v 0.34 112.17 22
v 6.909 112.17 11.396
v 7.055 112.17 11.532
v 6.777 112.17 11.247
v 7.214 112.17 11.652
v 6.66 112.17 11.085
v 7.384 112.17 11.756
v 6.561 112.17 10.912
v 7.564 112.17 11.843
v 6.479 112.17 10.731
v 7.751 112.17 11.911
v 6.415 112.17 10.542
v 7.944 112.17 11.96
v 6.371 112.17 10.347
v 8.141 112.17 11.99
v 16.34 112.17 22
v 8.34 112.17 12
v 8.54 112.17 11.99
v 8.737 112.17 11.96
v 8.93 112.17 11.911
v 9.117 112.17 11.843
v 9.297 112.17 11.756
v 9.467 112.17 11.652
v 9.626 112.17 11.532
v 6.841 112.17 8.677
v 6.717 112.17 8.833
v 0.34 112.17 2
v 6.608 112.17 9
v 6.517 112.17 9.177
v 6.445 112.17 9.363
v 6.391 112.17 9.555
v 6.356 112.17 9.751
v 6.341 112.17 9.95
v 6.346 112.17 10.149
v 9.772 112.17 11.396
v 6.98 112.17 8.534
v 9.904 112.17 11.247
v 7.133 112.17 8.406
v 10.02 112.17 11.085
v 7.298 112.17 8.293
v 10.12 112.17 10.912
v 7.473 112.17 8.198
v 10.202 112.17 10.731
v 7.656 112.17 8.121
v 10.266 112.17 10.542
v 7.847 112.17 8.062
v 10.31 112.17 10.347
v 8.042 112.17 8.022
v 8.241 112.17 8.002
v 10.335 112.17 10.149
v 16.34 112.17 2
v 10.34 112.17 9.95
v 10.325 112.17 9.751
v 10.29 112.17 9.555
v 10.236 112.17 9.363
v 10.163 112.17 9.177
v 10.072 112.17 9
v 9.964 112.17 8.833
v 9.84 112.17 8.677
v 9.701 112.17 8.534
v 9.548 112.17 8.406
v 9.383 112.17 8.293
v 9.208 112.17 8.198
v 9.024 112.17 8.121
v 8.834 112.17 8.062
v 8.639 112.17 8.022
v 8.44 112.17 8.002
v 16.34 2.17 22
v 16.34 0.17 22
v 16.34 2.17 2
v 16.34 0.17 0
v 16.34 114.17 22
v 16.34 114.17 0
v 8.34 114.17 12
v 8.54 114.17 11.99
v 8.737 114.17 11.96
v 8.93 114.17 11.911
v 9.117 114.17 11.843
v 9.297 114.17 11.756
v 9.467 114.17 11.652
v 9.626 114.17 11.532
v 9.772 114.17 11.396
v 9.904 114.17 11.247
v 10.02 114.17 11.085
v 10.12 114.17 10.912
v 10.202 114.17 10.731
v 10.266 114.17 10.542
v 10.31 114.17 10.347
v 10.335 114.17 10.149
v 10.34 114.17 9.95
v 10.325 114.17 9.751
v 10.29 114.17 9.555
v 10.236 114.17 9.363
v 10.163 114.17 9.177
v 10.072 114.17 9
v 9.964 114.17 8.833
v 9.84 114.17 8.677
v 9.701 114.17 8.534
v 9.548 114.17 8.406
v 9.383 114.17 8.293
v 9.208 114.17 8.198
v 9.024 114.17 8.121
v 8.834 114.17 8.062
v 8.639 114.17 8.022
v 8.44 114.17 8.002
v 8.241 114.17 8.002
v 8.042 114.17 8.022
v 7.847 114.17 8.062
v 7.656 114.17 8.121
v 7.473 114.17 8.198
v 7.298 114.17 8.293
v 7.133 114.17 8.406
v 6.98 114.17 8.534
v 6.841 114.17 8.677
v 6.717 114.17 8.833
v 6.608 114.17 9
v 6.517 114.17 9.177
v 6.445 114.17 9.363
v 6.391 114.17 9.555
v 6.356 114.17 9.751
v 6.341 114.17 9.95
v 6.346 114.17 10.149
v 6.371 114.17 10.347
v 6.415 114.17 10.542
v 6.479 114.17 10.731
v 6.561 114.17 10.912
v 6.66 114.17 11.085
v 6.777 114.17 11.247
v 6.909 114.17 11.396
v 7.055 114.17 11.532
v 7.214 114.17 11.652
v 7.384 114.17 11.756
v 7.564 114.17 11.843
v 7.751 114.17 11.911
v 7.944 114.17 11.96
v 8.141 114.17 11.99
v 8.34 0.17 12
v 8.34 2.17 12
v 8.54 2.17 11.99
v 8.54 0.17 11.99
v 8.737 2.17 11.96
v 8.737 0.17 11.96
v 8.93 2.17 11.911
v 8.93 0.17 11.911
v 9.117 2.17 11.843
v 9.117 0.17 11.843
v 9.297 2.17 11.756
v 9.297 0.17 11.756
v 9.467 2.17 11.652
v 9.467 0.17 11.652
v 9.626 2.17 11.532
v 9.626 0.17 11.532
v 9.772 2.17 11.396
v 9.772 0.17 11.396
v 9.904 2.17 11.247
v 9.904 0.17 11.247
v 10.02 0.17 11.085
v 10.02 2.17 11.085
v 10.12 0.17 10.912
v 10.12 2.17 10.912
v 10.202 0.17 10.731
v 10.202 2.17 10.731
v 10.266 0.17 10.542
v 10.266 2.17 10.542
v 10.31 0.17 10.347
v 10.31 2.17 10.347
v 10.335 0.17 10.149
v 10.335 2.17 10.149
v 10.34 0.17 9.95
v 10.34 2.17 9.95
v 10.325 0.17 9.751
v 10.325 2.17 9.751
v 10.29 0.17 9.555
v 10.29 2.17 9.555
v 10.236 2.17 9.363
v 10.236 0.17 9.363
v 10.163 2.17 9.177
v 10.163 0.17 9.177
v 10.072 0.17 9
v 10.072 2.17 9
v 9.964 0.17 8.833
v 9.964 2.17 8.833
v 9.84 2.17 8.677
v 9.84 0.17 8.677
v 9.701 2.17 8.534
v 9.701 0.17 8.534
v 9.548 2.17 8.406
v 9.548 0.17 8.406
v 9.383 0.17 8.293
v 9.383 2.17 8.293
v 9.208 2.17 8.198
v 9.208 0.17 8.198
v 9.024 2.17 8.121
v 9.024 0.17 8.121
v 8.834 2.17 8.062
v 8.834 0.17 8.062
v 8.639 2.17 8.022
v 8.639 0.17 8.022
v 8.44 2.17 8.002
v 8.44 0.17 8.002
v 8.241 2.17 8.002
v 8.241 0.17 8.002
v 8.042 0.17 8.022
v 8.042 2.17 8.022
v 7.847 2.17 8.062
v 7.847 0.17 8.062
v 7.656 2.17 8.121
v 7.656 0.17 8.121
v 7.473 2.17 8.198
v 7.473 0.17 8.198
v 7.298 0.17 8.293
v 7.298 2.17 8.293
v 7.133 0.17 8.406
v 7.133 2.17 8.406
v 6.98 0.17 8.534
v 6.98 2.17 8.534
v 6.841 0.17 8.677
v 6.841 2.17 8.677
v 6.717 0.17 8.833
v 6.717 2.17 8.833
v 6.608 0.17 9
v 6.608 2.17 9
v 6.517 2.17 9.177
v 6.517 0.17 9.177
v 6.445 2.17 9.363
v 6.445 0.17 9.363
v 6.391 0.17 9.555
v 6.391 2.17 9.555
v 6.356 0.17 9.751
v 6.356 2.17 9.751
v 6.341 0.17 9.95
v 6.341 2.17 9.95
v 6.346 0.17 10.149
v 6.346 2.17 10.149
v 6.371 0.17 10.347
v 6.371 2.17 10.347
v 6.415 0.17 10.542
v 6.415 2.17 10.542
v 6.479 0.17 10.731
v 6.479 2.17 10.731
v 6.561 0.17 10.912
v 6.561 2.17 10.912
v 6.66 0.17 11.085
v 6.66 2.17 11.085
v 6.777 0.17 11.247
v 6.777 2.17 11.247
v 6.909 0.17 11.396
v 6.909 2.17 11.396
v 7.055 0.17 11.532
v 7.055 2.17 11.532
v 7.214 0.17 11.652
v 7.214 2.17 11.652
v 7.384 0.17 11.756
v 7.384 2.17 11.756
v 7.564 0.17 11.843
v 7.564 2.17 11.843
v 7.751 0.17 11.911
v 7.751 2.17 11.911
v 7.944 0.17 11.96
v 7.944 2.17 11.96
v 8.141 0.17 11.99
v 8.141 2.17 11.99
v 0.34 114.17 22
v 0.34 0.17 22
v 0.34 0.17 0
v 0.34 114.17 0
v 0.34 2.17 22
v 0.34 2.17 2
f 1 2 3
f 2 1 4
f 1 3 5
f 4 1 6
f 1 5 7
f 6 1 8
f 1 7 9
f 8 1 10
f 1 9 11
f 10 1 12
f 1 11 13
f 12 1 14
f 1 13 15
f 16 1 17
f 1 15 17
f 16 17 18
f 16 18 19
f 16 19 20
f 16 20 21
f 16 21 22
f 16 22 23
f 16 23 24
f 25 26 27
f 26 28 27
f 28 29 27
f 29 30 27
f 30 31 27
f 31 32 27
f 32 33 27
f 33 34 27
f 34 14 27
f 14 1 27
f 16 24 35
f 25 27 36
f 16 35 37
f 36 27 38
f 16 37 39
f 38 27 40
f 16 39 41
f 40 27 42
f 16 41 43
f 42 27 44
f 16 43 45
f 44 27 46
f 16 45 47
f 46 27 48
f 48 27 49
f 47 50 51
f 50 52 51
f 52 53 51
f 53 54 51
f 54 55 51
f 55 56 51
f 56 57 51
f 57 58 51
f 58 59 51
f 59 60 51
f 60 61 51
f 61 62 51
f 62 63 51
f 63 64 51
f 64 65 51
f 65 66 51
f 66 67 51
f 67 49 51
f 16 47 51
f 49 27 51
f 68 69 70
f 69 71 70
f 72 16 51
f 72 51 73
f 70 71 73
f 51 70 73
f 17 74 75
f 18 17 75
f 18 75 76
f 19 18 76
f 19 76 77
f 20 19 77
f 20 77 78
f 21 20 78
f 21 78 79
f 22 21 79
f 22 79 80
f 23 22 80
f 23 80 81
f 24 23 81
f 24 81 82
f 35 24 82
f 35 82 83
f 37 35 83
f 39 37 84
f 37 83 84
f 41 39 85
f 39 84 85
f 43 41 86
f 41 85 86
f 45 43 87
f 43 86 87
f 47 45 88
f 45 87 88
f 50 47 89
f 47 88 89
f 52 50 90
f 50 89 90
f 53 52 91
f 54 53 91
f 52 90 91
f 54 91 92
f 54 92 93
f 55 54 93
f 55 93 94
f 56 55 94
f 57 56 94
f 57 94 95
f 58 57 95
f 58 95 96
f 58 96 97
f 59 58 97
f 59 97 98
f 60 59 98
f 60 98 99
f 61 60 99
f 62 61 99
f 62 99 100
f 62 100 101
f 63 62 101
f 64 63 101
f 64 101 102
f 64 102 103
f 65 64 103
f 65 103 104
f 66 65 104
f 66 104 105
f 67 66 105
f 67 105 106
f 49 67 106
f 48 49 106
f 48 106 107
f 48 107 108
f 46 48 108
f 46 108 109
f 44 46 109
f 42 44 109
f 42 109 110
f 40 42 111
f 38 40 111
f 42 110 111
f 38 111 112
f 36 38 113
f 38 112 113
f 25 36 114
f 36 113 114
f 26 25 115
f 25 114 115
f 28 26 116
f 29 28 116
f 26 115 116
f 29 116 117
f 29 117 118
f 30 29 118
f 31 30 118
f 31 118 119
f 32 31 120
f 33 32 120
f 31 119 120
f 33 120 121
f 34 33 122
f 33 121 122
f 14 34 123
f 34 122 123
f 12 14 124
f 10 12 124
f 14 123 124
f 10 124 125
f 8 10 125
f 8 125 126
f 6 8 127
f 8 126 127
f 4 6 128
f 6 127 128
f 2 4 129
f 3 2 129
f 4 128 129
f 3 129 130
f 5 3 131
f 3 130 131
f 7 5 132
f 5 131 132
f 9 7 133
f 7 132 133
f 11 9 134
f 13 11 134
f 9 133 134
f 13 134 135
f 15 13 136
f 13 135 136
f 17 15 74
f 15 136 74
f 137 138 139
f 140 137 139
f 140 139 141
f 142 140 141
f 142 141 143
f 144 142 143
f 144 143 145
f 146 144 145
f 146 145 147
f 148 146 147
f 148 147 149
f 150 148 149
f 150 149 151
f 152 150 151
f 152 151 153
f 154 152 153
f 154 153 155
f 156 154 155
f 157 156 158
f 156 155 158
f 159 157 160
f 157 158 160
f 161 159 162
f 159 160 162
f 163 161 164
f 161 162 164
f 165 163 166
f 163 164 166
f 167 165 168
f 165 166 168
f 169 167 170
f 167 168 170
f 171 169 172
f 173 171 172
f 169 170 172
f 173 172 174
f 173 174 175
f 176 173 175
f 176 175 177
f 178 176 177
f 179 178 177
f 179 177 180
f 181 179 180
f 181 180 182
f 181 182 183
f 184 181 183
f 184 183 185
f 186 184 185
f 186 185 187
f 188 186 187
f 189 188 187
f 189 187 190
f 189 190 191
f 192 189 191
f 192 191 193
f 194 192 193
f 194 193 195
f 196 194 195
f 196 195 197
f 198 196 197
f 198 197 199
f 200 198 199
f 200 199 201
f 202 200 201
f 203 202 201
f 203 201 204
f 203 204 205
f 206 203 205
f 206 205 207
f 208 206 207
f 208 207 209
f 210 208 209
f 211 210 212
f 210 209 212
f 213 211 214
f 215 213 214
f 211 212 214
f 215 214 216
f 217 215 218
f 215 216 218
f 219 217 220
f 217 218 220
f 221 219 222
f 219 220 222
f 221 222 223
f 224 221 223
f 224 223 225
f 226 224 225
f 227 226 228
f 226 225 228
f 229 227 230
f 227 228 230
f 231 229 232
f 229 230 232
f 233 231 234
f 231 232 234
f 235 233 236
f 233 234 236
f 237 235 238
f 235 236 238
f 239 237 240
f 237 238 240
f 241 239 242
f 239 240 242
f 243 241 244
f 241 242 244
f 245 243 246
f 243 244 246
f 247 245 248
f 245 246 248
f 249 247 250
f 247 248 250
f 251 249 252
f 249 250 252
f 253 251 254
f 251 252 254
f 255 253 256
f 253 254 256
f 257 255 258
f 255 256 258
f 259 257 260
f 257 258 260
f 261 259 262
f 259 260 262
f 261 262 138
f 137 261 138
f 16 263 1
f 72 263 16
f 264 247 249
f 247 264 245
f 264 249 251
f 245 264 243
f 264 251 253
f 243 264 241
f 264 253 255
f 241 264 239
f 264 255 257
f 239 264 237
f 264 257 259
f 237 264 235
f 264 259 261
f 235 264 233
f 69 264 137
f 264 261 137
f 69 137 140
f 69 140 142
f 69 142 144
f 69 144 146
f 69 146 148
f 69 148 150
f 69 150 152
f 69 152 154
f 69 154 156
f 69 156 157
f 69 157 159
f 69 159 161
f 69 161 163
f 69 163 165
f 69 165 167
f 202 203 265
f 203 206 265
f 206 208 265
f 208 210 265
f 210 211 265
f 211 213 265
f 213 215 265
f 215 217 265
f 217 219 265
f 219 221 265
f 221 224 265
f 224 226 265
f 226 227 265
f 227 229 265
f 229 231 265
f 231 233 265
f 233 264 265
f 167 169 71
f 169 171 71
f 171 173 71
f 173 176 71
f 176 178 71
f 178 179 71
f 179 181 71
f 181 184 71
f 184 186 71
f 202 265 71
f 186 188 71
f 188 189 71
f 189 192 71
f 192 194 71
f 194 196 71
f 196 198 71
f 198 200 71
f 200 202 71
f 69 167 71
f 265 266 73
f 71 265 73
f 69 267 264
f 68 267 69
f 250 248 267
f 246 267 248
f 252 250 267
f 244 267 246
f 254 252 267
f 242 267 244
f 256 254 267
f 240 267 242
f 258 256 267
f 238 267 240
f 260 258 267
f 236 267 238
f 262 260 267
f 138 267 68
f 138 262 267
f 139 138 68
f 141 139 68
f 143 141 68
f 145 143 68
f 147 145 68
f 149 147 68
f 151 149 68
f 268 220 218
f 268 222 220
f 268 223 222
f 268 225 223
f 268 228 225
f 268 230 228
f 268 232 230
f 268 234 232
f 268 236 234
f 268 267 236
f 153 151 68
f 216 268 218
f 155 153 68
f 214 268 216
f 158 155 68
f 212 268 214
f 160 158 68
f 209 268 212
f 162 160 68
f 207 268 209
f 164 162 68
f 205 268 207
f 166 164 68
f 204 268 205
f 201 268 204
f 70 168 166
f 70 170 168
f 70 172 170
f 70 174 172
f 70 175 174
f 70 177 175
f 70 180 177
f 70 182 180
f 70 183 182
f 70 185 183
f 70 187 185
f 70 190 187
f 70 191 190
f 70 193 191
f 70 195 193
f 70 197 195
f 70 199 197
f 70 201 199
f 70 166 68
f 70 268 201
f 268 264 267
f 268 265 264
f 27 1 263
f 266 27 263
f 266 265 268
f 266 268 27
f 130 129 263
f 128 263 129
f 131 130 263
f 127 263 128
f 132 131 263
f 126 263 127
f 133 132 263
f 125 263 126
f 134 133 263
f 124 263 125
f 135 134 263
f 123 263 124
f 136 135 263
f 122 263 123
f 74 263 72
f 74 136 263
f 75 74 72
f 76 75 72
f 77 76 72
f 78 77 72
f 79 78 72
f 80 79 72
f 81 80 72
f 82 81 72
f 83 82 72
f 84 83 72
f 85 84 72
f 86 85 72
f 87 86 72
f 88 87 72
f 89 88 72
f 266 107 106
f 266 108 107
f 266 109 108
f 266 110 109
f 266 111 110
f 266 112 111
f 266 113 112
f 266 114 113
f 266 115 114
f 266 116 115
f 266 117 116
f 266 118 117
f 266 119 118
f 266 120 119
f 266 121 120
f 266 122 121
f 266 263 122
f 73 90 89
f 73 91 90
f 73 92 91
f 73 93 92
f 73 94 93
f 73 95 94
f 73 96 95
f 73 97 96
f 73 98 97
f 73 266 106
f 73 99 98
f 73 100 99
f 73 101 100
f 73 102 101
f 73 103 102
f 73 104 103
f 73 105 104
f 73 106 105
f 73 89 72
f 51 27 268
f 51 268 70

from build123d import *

# Parameters (mm, degrees)
SKETCH1_W           = 16
SKETCH1_H           = 114
BOSS_EXTRUDE2_DEPTH = 2
SKETCH2_W           = 16
SKETCH2_H           = 2
BOSS_EXTRUDE3_DEPTH = 20
SKETCH3_W           = 16
SKETCH3_H           = 2
BOSS_EXTRUDE4_DEPTH = 20
SKETCH4_R           = 2
CUT_EXTRUDE2_DEPTH  = 118.247641795


with BuildPart() as part:
    # Sketch1 → Boss-Extrude2 (new body)
    with BuildSketch(Plane.XY):
        with Locations((8.340425532, 57.170212766)):
            Rectangle(SKETCH1_W, SKETCH1_H)
    extrude(amount=BOSS_EXTRUDE2_DEPTH)

    # Sketch2 → Boss-Extrude3 (add)
    with BuildSketch(Plane.XY.offset(2)):
        with Locations((8.340425532, 113.170212766)):
            Rectangle(SKETCH2_W, SKETCH2_H)
    extrude(amount=BOSS_EXTRUDE3_DEPTH)

    # Sketch3 → Boss-Extrude4 (add)
    with BuildSketch(Plane.XY.offset(2)):
        with Locations((8.340425532, 1.170212766)):
            Rectangle(SKETCH3_W, SKETCH3_H)
    extrude(amount=BOSS_EXTRUDE4_DEPTH)

    # Sketch4 → Cut-Extrude2 (cut, through all)
    with BuildSketch(Plane(origin=(0, 114.170212766, 0), x_dir=(1, 0, 0), z_dir=(0, 1, 0))):
        with Locations(Location((8.340425532, -10, 0), (0, 0, 270))):
            Circle(SKETCH4_R)
    extrude(amount=-CUT_EXTRUDE2_DEPTH, mode=Mode.SUBTRACT)


solid = part.part
